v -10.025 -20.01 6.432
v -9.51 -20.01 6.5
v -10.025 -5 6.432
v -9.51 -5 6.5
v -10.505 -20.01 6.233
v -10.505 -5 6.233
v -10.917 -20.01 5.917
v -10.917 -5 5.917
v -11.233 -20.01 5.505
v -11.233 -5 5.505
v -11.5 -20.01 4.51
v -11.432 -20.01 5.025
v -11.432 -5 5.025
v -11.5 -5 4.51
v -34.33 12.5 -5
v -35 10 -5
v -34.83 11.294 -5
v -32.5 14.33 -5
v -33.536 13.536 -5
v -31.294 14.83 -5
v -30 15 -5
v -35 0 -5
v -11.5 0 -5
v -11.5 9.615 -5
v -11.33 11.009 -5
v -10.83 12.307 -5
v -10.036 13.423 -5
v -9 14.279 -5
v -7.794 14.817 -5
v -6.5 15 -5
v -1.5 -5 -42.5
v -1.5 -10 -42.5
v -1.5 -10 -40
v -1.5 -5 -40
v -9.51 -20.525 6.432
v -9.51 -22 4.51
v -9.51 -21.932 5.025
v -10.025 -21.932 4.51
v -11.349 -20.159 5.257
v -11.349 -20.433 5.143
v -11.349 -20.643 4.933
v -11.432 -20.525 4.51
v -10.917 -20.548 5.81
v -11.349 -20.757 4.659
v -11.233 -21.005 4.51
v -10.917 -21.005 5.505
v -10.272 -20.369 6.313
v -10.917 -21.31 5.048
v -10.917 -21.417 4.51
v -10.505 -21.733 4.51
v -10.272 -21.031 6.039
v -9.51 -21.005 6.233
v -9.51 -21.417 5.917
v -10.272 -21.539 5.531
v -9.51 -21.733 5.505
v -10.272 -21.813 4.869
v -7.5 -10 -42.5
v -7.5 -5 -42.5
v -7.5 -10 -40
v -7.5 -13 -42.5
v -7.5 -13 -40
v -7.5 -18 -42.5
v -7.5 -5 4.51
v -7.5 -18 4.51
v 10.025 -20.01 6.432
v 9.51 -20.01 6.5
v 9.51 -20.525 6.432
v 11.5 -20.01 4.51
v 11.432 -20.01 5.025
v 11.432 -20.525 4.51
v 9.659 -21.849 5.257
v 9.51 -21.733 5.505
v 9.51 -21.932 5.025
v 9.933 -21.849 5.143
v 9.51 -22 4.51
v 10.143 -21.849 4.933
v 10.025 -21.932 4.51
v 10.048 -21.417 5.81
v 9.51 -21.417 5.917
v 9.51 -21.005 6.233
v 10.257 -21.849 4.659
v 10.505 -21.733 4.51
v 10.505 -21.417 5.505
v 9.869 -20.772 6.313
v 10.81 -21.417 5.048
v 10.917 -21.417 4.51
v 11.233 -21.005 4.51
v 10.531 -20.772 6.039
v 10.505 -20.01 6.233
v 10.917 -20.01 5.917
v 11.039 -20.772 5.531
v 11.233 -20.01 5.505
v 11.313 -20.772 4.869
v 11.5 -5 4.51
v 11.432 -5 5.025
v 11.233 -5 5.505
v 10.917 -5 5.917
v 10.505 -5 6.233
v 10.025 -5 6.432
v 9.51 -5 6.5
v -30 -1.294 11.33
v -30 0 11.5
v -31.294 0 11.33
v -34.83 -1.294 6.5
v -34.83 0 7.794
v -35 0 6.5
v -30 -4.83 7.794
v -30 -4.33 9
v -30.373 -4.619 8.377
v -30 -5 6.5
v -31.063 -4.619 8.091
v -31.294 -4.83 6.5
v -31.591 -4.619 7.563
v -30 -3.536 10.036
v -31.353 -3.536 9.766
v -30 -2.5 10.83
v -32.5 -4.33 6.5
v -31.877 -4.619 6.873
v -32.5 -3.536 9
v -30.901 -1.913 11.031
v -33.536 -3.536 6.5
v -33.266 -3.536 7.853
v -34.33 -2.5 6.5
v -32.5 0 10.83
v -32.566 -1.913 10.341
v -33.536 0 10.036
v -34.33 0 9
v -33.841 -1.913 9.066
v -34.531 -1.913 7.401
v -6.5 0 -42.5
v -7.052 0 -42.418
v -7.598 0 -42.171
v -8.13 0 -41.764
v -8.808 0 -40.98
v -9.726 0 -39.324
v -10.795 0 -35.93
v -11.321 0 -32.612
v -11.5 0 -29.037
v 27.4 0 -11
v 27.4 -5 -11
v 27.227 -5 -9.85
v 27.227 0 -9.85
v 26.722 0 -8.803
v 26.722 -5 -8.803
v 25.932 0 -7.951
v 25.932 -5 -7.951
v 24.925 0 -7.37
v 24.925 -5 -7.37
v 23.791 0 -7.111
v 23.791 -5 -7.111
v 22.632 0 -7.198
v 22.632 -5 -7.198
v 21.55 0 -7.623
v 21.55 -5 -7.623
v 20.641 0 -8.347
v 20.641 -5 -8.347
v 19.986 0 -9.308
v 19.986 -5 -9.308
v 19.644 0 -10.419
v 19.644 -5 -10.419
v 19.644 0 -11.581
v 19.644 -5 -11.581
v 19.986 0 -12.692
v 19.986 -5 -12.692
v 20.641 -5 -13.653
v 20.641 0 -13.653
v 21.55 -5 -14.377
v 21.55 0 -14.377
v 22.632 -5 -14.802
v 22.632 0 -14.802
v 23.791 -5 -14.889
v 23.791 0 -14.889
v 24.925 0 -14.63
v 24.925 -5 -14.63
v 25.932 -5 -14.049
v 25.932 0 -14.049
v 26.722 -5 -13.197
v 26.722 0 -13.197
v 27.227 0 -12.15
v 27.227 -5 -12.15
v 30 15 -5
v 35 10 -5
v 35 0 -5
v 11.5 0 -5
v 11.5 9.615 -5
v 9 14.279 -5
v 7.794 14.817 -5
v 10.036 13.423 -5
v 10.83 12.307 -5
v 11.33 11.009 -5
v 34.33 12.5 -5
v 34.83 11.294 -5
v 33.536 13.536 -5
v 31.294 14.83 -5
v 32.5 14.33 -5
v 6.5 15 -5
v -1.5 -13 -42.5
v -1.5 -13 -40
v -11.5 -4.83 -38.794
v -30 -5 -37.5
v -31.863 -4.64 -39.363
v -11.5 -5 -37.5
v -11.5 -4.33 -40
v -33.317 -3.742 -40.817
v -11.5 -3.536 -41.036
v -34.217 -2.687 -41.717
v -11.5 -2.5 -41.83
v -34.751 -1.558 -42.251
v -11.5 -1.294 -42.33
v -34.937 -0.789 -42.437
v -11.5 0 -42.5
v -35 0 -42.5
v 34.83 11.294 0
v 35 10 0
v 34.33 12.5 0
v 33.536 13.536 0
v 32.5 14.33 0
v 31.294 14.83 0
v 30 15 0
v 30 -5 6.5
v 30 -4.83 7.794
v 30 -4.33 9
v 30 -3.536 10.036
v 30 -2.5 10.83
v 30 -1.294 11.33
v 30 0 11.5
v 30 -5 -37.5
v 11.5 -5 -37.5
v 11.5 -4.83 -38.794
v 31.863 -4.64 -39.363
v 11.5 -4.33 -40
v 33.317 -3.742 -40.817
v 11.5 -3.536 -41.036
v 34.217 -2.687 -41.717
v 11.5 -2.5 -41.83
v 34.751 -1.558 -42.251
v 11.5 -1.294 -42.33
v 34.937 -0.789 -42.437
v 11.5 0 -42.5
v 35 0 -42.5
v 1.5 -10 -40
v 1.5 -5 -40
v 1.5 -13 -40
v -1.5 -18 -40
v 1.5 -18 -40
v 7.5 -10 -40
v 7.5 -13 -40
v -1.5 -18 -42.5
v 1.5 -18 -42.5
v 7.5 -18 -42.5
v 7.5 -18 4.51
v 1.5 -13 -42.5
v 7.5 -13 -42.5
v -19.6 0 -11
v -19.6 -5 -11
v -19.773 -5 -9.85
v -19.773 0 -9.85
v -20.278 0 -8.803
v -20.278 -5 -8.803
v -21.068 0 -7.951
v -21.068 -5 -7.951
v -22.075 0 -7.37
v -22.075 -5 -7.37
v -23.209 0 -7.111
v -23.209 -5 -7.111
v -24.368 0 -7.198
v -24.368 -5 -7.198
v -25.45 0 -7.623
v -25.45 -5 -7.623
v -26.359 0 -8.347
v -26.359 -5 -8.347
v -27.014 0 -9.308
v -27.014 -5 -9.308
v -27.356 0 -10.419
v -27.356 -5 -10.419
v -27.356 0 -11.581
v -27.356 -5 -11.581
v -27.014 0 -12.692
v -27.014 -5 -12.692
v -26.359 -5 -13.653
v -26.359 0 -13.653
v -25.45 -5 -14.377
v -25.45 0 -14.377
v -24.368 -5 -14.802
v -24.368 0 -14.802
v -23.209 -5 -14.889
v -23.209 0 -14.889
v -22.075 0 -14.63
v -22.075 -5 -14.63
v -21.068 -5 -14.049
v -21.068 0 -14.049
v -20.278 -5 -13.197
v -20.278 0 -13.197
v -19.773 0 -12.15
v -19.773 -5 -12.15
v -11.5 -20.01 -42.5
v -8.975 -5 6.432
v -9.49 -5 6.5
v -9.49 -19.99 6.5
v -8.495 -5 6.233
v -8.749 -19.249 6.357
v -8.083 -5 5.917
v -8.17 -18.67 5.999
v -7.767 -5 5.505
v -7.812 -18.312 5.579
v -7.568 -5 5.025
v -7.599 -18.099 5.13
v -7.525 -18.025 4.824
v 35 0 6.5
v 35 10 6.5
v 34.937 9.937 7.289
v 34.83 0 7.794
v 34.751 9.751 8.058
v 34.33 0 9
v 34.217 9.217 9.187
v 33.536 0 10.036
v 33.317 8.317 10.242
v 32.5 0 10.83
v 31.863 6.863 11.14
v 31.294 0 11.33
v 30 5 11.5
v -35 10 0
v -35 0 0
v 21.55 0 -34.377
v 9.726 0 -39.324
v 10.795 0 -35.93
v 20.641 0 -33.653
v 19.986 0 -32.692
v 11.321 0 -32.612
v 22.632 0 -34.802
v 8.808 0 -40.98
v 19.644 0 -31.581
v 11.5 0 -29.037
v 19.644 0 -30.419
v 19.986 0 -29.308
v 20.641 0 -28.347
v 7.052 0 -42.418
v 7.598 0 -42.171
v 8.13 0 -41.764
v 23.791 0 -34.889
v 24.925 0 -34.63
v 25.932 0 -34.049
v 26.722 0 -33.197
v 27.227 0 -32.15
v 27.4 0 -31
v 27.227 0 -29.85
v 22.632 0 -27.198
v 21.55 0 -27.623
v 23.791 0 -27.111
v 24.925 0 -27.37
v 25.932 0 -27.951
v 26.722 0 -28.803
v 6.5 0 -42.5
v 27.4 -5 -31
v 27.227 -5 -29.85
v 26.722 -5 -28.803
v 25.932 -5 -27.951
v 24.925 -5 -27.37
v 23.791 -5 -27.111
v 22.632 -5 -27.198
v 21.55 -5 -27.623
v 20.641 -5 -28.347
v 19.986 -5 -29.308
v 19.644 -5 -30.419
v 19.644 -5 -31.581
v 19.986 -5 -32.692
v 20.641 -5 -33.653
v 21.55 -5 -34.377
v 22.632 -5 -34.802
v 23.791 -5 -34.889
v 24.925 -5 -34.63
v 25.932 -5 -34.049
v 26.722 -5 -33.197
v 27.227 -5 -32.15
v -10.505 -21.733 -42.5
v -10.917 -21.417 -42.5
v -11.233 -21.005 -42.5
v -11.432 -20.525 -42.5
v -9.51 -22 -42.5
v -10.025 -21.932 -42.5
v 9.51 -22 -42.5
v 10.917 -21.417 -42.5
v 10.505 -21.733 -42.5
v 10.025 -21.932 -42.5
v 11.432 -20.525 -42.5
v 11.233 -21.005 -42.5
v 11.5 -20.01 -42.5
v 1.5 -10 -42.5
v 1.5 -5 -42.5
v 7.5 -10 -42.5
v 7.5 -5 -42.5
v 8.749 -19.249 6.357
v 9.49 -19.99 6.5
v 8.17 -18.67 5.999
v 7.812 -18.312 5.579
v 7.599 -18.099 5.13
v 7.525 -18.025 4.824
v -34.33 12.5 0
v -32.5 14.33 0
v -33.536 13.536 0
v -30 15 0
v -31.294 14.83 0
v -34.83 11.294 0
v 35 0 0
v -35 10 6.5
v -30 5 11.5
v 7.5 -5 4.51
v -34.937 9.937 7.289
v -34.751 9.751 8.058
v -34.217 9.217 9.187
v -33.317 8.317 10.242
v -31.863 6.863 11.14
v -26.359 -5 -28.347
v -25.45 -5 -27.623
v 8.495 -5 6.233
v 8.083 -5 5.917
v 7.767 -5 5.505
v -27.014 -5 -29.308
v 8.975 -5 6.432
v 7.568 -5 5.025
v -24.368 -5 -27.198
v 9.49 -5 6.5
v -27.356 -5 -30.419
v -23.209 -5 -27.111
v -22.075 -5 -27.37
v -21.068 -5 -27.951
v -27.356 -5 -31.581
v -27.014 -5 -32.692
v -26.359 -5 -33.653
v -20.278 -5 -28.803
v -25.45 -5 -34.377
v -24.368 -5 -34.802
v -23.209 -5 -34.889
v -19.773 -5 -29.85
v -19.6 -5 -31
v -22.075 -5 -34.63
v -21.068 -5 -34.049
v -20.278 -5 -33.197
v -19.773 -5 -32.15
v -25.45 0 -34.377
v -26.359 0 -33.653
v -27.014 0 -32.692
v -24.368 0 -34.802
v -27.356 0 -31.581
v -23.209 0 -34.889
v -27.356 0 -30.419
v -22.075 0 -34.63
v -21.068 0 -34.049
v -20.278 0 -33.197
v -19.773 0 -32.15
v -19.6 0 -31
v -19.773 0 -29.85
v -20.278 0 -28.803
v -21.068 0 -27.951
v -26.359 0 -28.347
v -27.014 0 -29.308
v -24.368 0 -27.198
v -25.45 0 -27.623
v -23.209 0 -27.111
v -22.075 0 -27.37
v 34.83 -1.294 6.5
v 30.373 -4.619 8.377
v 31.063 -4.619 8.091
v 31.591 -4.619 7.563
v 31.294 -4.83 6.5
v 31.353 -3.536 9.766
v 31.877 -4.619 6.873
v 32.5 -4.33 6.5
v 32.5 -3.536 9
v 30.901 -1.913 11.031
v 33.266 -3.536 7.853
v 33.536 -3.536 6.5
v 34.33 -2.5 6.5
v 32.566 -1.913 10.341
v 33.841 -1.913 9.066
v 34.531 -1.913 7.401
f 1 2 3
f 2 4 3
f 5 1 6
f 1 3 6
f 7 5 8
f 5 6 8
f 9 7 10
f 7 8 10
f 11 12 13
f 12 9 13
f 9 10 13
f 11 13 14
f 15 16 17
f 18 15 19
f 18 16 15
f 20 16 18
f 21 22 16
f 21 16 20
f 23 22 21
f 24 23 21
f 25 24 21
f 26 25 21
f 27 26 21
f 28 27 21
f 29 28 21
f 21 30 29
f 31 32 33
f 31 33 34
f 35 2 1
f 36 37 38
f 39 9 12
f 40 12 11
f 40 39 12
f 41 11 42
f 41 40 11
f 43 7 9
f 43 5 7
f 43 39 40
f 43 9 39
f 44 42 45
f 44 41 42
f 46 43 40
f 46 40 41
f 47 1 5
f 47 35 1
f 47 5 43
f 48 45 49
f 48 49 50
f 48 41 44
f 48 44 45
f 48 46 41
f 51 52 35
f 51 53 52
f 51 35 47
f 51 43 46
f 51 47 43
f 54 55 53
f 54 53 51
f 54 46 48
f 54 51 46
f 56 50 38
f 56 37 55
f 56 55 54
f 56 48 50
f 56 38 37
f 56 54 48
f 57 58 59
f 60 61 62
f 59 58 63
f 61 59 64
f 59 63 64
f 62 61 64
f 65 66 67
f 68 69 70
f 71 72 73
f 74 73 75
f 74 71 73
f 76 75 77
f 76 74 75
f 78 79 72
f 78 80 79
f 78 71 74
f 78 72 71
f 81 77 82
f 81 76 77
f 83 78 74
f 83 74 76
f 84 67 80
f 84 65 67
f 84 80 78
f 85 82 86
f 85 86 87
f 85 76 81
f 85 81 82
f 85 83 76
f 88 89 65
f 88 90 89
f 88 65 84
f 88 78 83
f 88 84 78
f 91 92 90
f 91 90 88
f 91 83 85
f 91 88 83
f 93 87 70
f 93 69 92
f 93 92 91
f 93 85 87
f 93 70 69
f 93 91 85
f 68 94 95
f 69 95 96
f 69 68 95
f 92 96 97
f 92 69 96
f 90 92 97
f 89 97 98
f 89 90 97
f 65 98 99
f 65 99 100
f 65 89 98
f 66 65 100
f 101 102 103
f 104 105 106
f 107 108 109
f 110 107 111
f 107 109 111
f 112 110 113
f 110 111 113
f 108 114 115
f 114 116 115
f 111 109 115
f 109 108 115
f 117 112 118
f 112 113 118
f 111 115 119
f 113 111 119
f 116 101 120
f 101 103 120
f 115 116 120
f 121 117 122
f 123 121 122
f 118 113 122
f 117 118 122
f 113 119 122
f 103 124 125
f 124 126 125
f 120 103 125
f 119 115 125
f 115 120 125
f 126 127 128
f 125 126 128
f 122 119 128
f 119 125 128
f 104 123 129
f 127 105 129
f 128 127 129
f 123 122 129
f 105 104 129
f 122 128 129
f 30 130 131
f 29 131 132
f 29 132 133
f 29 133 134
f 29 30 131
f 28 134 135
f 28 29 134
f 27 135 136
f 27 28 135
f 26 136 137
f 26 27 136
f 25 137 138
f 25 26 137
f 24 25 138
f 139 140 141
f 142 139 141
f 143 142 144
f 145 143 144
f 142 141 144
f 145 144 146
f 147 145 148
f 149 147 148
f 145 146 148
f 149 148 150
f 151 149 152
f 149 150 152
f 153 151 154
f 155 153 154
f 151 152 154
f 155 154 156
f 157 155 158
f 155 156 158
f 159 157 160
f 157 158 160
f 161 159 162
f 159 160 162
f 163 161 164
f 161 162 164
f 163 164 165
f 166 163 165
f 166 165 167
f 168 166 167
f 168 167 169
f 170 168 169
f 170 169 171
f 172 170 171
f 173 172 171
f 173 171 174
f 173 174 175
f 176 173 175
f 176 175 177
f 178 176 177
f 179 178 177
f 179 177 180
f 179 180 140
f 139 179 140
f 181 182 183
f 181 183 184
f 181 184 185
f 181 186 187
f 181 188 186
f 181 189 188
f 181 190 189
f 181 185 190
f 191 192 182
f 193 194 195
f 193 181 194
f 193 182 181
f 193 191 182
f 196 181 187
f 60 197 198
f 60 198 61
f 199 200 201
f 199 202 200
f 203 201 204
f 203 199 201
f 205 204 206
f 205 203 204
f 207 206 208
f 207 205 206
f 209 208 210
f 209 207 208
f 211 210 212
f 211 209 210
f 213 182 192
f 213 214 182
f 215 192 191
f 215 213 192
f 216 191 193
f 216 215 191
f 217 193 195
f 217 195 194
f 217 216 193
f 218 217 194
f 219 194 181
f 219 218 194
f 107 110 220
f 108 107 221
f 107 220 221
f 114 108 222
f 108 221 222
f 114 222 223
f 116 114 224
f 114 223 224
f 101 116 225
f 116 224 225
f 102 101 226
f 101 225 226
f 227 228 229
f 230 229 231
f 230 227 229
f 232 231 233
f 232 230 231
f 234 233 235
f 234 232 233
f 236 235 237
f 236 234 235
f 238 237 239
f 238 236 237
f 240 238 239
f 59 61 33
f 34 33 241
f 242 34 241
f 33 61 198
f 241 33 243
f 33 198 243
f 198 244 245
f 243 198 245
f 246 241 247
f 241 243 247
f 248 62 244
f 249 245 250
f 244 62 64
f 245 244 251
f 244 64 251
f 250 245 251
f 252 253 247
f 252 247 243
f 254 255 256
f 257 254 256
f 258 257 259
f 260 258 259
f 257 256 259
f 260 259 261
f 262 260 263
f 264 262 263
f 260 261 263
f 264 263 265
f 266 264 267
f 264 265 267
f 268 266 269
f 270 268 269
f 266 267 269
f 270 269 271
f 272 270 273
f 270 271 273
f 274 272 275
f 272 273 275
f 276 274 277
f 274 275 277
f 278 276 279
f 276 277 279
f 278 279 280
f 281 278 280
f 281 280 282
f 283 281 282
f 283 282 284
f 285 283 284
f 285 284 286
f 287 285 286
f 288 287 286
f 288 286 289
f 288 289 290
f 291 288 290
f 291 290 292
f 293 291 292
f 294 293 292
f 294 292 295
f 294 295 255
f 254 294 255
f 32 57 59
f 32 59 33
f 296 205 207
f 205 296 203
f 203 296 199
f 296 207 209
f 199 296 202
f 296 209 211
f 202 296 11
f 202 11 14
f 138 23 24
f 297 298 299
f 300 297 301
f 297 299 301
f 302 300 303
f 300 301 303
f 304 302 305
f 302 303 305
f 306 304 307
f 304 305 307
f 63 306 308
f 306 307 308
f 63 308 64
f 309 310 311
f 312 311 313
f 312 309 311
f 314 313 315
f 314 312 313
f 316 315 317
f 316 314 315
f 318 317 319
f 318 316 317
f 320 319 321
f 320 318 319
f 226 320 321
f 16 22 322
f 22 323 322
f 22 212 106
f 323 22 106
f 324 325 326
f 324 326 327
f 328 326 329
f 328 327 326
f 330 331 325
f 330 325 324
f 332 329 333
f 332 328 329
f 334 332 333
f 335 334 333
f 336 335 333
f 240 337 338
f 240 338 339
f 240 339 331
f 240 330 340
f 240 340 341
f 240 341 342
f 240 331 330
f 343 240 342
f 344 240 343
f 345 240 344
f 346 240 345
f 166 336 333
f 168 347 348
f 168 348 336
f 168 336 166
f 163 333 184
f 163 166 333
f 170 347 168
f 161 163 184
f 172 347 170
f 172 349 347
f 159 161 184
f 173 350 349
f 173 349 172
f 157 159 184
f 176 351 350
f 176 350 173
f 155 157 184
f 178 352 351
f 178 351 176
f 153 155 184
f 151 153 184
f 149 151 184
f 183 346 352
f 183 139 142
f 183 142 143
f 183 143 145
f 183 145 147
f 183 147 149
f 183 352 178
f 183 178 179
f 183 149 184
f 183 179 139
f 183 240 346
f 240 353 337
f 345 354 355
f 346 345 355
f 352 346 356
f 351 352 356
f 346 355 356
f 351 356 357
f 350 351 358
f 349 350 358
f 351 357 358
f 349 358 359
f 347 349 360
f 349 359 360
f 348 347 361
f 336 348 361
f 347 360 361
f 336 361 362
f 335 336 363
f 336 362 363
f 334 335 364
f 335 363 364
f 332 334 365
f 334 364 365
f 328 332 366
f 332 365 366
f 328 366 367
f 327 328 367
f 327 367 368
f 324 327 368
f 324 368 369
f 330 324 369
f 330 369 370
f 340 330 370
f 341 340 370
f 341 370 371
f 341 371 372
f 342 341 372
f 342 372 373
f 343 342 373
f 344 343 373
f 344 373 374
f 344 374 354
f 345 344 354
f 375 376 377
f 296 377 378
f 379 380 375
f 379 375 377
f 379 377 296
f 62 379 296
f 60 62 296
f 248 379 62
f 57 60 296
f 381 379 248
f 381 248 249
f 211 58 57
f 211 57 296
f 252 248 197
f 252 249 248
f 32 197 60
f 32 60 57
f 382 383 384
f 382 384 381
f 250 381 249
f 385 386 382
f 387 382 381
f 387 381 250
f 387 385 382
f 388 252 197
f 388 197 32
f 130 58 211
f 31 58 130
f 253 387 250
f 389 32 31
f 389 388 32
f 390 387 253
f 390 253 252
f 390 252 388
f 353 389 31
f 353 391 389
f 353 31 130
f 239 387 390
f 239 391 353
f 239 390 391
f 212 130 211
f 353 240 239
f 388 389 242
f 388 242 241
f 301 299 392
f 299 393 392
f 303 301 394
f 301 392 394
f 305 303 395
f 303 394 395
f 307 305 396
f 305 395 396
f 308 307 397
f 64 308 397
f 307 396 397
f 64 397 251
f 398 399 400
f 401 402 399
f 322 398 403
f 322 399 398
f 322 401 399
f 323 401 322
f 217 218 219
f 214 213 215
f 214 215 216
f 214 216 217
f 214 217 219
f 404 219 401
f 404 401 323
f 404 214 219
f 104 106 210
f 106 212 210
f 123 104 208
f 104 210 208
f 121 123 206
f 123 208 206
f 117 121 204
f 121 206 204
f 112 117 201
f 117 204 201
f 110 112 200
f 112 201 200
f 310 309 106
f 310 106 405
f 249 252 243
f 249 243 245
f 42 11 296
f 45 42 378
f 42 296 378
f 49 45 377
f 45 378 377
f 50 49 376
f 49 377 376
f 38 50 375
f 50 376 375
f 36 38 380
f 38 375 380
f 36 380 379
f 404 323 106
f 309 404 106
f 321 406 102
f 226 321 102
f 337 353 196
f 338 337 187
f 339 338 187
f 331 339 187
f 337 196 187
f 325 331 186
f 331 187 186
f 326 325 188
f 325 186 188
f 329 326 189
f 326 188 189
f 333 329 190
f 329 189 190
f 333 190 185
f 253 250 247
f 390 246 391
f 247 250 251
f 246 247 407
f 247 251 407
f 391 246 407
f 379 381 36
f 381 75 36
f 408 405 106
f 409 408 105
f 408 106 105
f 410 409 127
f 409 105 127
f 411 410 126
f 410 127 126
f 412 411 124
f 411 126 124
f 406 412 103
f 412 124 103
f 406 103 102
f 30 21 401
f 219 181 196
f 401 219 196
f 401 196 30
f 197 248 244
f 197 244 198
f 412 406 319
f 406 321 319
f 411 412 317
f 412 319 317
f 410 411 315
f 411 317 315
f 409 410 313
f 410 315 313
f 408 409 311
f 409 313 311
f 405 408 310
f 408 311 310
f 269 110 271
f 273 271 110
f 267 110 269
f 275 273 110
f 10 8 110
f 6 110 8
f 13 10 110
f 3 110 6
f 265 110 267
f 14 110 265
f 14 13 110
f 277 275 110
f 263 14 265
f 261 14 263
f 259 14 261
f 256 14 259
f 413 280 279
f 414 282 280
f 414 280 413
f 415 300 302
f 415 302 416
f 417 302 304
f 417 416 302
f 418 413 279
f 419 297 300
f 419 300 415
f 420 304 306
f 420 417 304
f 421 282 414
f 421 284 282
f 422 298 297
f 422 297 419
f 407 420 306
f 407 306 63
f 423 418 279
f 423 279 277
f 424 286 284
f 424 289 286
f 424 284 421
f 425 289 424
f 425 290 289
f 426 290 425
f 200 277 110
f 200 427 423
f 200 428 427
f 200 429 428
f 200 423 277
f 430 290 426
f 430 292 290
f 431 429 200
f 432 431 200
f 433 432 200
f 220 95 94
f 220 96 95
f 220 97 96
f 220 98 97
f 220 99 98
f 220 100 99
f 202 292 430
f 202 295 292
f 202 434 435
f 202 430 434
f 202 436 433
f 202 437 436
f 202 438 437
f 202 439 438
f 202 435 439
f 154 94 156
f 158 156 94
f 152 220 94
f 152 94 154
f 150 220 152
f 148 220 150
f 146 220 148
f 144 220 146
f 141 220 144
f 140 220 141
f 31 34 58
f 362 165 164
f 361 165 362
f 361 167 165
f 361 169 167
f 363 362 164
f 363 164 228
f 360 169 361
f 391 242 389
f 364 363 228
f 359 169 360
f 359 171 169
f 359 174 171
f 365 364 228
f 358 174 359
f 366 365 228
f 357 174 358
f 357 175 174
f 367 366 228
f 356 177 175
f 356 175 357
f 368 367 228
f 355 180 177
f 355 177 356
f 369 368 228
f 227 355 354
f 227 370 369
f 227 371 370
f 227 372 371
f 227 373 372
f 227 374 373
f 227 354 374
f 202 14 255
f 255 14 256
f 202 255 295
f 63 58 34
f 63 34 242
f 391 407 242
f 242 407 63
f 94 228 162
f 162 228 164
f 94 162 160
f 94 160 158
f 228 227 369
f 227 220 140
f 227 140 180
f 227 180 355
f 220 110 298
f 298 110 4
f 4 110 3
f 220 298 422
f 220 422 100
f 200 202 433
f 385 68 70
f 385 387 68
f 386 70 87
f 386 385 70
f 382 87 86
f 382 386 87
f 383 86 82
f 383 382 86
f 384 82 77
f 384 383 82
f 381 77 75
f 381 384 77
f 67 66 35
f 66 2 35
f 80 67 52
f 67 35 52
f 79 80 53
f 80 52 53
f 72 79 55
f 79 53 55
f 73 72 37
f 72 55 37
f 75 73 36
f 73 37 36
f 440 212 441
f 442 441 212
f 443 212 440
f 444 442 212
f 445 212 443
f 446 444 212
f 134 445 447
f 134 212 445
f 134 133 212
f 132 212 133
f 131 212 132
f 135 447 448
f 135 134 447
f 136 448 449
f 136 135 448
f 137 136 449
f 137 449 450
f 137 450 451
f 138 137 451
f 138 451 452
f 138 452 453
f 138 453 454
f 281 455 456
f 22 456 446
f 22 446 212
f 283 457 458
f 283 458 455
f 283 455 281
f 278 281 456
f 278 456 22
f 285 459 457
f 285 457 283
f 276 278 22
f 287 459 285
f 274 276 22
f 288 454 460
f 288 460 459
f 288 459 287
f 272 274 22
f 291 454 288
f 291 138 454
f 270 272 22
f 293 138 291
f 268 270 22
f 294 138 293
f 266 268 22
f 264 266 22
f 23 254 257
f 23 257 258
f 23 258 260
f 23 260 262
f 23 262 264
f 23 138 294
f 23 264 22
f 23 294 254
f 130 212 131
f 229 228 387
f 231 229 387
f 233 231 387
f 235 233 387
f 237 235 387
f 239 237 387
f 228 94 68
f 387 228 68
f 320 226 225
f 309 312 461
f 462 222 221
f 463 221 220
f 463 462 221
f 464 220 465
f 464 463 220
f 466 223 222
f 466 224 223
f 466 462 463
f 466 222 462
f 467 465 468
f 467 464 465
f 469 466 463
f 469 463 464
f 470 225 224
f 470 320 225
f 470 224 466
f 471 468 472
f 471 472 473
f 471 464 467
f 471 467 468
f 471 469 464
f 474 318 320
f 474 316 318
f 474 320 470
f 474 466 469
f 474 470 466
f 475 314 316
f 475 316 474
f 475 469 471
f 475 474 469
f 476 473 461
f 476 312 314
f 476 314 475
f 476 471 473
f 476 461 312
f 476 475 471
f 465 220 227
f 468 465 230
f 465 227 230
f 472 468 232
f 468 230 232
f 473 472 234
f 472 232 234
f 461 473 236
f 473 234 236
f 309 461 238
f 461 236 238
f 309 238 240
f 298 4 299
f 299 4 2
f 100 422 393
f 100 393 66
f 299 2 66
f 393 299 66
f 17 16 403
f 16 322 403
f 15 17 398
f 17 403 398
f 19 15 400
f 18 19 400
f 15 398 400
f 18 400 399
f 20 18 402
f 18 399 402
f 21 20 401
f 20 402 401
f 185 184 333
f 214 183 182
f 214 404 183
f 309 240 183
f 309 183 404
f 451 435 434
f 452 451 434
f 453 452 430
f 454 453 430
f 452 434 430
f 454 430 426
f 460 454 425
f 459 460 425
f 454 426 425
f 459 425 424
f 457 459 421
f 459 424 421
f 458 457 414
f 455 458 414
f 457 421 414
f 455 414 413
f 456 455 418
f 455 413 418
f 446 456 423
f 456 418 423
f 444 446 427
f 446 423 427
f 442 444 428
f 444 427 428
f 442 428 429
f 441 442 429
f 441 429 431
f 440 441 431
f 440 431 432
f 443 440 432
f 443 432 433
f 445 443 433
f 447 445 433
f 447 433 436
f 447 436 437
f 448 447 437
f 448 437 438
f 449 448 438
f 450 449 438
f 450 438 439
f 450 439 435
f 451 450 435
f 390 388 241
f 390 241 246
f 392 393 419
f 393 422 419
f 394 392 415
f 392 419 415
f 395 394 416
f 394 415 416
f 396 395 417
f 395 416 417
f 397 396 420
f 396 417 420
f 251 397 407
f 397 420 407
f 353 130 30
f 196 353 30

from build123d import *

# Parameters (mm, degrees)
F1_DEPTH       = 35
F1_DEPTH_BACK  = 35
F3_DEPTH       = 49
F4_R           = 1.99
F5_R           = 3.9
F6_DEPTH       = 25
F8_DEPTH       = 2.5
F10_DEPTH      = 11.5
F10_DEPTH_BACK = 11.5
F11_R          = 4.99999


# Not quite as in the source:
# - a fillet or chamfer is up to 0.001 mm smaller than in the source, because OpenCascade refuses the exact size


with BuildPart() as f1:
    # F0 (on Right) → F1 (new body, two sides)
    with BuildSketch(Plane.YZ) as f1_sk:
        Polygon((15, 0), (0, 0), (0, 6.5), (10, 6.5), (10, 11.5), (-5, 11.5), (-5, -5), (-5, -42.5), (0, -42.5), (0, -5), (15, -5), align=None)
    extrude(amount=F1_DEPTH)
    extrude(f1_sk.sketch, amount=-F1_DEPTH_BACK)

    # F2 (on face) → F3 (join, through all)
    with BuildSketch(Plane(origin=(0, 0, 6.5), x_dir=(1, 0, 0), z_dir=(0, 0, -1))):
        Polygon((7.5, 18), (7.5, 5), (11.5, 5), (11.5, 22), (0, 22), (-11.5, 22), (-11.5, 5), (-7.5, 5), (-7.5, 18), (0, 18), align=None)
    extrude(amount=F3_DEPTH)

    # F4
    f4_edges = [f1.edges().sort_by_distance(p)[0] for p in [
        (11.5, -13.5, 6.5),
        (7.5, -11.5, 6.5),
        (-7.5, -11.5, 6.5),
        (0, -18, 6.5),
        (0, -22, 6.5),
        (-11.5, -13.5, 6.5),
        (-11.5, -22, -18),
        (11.5, -22, -18),
    ]]
    fillet(f4_edges, radius=F4_R)

    # F5 (on face) → F6 (cut)
    with BuildSketch(Plane.XZ.offset(5)):
        with Locations((23.5, -11)):
            Circle(F5_R)
        with Locations((23.5, -31)):
            Circle(F5_R)
        with Locations((-23.5, -11)):
            Circle(F5_R)
        with Locations((-23.5, -31)):
            Circle(F5_R)
    extrude(amount=-F6_DEPTH, mode=Mode.SUBTRACT)

    # F7 (on face) → F8 (join)
    with BuildSketch(Plane(origin=(0, 0, -42.5), x_dir=(1, 0, 0), z_dir=(0, 0, -1))):
        Polygon((1.5, 18), (0, 18), (-1.5, 18), (-1.5, 13), (-7.5, 13), (-7.5, 11.5), (-7.5, 10), (-1.5, 10), (-1.5, 5), (0, 5), (1.5, 5), (1.5, 10), (7.5, 10), (7.5, 11.5), (7.5, 13), (1.5, 13), align=None)
    extrude(amount=-F8_DEPTH)

    # F9 (on Right) → F10 (join, two sides)
    with BuildSketch(Plane.YZ) as f10_sk:
        Polygon((0, -5), (0, -42.5), (15, -5), align=None)
    extrude(amount=-F10_DEPTH)
    extrude(f10_sk.sketch, amount=F10_DEPTH_BACK)

    # F11 (radius 5 in the source; OpenCascade refuses exactly that, so slightly less here)
    f11_edges = [f1.edges().sort_by_distance(p)[0] for p in [
        (-23.25, -5, -42.5),
        (23.25, -5, -42.5),
        (0, 10, 11.5),
        (35, 2.5, 11.5),
        (-35, 2.5, 11.5),
        (0, -5, 11.5),
        (-35, -5, -15.5),
        (35, -5, -15.5),
        (11.5, 7.5, -23.75),
        (-11.5, 7.5, -23.75),
        (35, 15, -2.5),
        (-35, 15, -2.5),
    ]]
    fillet(f11_edges, radius=F11_R)


solid = f1.part
